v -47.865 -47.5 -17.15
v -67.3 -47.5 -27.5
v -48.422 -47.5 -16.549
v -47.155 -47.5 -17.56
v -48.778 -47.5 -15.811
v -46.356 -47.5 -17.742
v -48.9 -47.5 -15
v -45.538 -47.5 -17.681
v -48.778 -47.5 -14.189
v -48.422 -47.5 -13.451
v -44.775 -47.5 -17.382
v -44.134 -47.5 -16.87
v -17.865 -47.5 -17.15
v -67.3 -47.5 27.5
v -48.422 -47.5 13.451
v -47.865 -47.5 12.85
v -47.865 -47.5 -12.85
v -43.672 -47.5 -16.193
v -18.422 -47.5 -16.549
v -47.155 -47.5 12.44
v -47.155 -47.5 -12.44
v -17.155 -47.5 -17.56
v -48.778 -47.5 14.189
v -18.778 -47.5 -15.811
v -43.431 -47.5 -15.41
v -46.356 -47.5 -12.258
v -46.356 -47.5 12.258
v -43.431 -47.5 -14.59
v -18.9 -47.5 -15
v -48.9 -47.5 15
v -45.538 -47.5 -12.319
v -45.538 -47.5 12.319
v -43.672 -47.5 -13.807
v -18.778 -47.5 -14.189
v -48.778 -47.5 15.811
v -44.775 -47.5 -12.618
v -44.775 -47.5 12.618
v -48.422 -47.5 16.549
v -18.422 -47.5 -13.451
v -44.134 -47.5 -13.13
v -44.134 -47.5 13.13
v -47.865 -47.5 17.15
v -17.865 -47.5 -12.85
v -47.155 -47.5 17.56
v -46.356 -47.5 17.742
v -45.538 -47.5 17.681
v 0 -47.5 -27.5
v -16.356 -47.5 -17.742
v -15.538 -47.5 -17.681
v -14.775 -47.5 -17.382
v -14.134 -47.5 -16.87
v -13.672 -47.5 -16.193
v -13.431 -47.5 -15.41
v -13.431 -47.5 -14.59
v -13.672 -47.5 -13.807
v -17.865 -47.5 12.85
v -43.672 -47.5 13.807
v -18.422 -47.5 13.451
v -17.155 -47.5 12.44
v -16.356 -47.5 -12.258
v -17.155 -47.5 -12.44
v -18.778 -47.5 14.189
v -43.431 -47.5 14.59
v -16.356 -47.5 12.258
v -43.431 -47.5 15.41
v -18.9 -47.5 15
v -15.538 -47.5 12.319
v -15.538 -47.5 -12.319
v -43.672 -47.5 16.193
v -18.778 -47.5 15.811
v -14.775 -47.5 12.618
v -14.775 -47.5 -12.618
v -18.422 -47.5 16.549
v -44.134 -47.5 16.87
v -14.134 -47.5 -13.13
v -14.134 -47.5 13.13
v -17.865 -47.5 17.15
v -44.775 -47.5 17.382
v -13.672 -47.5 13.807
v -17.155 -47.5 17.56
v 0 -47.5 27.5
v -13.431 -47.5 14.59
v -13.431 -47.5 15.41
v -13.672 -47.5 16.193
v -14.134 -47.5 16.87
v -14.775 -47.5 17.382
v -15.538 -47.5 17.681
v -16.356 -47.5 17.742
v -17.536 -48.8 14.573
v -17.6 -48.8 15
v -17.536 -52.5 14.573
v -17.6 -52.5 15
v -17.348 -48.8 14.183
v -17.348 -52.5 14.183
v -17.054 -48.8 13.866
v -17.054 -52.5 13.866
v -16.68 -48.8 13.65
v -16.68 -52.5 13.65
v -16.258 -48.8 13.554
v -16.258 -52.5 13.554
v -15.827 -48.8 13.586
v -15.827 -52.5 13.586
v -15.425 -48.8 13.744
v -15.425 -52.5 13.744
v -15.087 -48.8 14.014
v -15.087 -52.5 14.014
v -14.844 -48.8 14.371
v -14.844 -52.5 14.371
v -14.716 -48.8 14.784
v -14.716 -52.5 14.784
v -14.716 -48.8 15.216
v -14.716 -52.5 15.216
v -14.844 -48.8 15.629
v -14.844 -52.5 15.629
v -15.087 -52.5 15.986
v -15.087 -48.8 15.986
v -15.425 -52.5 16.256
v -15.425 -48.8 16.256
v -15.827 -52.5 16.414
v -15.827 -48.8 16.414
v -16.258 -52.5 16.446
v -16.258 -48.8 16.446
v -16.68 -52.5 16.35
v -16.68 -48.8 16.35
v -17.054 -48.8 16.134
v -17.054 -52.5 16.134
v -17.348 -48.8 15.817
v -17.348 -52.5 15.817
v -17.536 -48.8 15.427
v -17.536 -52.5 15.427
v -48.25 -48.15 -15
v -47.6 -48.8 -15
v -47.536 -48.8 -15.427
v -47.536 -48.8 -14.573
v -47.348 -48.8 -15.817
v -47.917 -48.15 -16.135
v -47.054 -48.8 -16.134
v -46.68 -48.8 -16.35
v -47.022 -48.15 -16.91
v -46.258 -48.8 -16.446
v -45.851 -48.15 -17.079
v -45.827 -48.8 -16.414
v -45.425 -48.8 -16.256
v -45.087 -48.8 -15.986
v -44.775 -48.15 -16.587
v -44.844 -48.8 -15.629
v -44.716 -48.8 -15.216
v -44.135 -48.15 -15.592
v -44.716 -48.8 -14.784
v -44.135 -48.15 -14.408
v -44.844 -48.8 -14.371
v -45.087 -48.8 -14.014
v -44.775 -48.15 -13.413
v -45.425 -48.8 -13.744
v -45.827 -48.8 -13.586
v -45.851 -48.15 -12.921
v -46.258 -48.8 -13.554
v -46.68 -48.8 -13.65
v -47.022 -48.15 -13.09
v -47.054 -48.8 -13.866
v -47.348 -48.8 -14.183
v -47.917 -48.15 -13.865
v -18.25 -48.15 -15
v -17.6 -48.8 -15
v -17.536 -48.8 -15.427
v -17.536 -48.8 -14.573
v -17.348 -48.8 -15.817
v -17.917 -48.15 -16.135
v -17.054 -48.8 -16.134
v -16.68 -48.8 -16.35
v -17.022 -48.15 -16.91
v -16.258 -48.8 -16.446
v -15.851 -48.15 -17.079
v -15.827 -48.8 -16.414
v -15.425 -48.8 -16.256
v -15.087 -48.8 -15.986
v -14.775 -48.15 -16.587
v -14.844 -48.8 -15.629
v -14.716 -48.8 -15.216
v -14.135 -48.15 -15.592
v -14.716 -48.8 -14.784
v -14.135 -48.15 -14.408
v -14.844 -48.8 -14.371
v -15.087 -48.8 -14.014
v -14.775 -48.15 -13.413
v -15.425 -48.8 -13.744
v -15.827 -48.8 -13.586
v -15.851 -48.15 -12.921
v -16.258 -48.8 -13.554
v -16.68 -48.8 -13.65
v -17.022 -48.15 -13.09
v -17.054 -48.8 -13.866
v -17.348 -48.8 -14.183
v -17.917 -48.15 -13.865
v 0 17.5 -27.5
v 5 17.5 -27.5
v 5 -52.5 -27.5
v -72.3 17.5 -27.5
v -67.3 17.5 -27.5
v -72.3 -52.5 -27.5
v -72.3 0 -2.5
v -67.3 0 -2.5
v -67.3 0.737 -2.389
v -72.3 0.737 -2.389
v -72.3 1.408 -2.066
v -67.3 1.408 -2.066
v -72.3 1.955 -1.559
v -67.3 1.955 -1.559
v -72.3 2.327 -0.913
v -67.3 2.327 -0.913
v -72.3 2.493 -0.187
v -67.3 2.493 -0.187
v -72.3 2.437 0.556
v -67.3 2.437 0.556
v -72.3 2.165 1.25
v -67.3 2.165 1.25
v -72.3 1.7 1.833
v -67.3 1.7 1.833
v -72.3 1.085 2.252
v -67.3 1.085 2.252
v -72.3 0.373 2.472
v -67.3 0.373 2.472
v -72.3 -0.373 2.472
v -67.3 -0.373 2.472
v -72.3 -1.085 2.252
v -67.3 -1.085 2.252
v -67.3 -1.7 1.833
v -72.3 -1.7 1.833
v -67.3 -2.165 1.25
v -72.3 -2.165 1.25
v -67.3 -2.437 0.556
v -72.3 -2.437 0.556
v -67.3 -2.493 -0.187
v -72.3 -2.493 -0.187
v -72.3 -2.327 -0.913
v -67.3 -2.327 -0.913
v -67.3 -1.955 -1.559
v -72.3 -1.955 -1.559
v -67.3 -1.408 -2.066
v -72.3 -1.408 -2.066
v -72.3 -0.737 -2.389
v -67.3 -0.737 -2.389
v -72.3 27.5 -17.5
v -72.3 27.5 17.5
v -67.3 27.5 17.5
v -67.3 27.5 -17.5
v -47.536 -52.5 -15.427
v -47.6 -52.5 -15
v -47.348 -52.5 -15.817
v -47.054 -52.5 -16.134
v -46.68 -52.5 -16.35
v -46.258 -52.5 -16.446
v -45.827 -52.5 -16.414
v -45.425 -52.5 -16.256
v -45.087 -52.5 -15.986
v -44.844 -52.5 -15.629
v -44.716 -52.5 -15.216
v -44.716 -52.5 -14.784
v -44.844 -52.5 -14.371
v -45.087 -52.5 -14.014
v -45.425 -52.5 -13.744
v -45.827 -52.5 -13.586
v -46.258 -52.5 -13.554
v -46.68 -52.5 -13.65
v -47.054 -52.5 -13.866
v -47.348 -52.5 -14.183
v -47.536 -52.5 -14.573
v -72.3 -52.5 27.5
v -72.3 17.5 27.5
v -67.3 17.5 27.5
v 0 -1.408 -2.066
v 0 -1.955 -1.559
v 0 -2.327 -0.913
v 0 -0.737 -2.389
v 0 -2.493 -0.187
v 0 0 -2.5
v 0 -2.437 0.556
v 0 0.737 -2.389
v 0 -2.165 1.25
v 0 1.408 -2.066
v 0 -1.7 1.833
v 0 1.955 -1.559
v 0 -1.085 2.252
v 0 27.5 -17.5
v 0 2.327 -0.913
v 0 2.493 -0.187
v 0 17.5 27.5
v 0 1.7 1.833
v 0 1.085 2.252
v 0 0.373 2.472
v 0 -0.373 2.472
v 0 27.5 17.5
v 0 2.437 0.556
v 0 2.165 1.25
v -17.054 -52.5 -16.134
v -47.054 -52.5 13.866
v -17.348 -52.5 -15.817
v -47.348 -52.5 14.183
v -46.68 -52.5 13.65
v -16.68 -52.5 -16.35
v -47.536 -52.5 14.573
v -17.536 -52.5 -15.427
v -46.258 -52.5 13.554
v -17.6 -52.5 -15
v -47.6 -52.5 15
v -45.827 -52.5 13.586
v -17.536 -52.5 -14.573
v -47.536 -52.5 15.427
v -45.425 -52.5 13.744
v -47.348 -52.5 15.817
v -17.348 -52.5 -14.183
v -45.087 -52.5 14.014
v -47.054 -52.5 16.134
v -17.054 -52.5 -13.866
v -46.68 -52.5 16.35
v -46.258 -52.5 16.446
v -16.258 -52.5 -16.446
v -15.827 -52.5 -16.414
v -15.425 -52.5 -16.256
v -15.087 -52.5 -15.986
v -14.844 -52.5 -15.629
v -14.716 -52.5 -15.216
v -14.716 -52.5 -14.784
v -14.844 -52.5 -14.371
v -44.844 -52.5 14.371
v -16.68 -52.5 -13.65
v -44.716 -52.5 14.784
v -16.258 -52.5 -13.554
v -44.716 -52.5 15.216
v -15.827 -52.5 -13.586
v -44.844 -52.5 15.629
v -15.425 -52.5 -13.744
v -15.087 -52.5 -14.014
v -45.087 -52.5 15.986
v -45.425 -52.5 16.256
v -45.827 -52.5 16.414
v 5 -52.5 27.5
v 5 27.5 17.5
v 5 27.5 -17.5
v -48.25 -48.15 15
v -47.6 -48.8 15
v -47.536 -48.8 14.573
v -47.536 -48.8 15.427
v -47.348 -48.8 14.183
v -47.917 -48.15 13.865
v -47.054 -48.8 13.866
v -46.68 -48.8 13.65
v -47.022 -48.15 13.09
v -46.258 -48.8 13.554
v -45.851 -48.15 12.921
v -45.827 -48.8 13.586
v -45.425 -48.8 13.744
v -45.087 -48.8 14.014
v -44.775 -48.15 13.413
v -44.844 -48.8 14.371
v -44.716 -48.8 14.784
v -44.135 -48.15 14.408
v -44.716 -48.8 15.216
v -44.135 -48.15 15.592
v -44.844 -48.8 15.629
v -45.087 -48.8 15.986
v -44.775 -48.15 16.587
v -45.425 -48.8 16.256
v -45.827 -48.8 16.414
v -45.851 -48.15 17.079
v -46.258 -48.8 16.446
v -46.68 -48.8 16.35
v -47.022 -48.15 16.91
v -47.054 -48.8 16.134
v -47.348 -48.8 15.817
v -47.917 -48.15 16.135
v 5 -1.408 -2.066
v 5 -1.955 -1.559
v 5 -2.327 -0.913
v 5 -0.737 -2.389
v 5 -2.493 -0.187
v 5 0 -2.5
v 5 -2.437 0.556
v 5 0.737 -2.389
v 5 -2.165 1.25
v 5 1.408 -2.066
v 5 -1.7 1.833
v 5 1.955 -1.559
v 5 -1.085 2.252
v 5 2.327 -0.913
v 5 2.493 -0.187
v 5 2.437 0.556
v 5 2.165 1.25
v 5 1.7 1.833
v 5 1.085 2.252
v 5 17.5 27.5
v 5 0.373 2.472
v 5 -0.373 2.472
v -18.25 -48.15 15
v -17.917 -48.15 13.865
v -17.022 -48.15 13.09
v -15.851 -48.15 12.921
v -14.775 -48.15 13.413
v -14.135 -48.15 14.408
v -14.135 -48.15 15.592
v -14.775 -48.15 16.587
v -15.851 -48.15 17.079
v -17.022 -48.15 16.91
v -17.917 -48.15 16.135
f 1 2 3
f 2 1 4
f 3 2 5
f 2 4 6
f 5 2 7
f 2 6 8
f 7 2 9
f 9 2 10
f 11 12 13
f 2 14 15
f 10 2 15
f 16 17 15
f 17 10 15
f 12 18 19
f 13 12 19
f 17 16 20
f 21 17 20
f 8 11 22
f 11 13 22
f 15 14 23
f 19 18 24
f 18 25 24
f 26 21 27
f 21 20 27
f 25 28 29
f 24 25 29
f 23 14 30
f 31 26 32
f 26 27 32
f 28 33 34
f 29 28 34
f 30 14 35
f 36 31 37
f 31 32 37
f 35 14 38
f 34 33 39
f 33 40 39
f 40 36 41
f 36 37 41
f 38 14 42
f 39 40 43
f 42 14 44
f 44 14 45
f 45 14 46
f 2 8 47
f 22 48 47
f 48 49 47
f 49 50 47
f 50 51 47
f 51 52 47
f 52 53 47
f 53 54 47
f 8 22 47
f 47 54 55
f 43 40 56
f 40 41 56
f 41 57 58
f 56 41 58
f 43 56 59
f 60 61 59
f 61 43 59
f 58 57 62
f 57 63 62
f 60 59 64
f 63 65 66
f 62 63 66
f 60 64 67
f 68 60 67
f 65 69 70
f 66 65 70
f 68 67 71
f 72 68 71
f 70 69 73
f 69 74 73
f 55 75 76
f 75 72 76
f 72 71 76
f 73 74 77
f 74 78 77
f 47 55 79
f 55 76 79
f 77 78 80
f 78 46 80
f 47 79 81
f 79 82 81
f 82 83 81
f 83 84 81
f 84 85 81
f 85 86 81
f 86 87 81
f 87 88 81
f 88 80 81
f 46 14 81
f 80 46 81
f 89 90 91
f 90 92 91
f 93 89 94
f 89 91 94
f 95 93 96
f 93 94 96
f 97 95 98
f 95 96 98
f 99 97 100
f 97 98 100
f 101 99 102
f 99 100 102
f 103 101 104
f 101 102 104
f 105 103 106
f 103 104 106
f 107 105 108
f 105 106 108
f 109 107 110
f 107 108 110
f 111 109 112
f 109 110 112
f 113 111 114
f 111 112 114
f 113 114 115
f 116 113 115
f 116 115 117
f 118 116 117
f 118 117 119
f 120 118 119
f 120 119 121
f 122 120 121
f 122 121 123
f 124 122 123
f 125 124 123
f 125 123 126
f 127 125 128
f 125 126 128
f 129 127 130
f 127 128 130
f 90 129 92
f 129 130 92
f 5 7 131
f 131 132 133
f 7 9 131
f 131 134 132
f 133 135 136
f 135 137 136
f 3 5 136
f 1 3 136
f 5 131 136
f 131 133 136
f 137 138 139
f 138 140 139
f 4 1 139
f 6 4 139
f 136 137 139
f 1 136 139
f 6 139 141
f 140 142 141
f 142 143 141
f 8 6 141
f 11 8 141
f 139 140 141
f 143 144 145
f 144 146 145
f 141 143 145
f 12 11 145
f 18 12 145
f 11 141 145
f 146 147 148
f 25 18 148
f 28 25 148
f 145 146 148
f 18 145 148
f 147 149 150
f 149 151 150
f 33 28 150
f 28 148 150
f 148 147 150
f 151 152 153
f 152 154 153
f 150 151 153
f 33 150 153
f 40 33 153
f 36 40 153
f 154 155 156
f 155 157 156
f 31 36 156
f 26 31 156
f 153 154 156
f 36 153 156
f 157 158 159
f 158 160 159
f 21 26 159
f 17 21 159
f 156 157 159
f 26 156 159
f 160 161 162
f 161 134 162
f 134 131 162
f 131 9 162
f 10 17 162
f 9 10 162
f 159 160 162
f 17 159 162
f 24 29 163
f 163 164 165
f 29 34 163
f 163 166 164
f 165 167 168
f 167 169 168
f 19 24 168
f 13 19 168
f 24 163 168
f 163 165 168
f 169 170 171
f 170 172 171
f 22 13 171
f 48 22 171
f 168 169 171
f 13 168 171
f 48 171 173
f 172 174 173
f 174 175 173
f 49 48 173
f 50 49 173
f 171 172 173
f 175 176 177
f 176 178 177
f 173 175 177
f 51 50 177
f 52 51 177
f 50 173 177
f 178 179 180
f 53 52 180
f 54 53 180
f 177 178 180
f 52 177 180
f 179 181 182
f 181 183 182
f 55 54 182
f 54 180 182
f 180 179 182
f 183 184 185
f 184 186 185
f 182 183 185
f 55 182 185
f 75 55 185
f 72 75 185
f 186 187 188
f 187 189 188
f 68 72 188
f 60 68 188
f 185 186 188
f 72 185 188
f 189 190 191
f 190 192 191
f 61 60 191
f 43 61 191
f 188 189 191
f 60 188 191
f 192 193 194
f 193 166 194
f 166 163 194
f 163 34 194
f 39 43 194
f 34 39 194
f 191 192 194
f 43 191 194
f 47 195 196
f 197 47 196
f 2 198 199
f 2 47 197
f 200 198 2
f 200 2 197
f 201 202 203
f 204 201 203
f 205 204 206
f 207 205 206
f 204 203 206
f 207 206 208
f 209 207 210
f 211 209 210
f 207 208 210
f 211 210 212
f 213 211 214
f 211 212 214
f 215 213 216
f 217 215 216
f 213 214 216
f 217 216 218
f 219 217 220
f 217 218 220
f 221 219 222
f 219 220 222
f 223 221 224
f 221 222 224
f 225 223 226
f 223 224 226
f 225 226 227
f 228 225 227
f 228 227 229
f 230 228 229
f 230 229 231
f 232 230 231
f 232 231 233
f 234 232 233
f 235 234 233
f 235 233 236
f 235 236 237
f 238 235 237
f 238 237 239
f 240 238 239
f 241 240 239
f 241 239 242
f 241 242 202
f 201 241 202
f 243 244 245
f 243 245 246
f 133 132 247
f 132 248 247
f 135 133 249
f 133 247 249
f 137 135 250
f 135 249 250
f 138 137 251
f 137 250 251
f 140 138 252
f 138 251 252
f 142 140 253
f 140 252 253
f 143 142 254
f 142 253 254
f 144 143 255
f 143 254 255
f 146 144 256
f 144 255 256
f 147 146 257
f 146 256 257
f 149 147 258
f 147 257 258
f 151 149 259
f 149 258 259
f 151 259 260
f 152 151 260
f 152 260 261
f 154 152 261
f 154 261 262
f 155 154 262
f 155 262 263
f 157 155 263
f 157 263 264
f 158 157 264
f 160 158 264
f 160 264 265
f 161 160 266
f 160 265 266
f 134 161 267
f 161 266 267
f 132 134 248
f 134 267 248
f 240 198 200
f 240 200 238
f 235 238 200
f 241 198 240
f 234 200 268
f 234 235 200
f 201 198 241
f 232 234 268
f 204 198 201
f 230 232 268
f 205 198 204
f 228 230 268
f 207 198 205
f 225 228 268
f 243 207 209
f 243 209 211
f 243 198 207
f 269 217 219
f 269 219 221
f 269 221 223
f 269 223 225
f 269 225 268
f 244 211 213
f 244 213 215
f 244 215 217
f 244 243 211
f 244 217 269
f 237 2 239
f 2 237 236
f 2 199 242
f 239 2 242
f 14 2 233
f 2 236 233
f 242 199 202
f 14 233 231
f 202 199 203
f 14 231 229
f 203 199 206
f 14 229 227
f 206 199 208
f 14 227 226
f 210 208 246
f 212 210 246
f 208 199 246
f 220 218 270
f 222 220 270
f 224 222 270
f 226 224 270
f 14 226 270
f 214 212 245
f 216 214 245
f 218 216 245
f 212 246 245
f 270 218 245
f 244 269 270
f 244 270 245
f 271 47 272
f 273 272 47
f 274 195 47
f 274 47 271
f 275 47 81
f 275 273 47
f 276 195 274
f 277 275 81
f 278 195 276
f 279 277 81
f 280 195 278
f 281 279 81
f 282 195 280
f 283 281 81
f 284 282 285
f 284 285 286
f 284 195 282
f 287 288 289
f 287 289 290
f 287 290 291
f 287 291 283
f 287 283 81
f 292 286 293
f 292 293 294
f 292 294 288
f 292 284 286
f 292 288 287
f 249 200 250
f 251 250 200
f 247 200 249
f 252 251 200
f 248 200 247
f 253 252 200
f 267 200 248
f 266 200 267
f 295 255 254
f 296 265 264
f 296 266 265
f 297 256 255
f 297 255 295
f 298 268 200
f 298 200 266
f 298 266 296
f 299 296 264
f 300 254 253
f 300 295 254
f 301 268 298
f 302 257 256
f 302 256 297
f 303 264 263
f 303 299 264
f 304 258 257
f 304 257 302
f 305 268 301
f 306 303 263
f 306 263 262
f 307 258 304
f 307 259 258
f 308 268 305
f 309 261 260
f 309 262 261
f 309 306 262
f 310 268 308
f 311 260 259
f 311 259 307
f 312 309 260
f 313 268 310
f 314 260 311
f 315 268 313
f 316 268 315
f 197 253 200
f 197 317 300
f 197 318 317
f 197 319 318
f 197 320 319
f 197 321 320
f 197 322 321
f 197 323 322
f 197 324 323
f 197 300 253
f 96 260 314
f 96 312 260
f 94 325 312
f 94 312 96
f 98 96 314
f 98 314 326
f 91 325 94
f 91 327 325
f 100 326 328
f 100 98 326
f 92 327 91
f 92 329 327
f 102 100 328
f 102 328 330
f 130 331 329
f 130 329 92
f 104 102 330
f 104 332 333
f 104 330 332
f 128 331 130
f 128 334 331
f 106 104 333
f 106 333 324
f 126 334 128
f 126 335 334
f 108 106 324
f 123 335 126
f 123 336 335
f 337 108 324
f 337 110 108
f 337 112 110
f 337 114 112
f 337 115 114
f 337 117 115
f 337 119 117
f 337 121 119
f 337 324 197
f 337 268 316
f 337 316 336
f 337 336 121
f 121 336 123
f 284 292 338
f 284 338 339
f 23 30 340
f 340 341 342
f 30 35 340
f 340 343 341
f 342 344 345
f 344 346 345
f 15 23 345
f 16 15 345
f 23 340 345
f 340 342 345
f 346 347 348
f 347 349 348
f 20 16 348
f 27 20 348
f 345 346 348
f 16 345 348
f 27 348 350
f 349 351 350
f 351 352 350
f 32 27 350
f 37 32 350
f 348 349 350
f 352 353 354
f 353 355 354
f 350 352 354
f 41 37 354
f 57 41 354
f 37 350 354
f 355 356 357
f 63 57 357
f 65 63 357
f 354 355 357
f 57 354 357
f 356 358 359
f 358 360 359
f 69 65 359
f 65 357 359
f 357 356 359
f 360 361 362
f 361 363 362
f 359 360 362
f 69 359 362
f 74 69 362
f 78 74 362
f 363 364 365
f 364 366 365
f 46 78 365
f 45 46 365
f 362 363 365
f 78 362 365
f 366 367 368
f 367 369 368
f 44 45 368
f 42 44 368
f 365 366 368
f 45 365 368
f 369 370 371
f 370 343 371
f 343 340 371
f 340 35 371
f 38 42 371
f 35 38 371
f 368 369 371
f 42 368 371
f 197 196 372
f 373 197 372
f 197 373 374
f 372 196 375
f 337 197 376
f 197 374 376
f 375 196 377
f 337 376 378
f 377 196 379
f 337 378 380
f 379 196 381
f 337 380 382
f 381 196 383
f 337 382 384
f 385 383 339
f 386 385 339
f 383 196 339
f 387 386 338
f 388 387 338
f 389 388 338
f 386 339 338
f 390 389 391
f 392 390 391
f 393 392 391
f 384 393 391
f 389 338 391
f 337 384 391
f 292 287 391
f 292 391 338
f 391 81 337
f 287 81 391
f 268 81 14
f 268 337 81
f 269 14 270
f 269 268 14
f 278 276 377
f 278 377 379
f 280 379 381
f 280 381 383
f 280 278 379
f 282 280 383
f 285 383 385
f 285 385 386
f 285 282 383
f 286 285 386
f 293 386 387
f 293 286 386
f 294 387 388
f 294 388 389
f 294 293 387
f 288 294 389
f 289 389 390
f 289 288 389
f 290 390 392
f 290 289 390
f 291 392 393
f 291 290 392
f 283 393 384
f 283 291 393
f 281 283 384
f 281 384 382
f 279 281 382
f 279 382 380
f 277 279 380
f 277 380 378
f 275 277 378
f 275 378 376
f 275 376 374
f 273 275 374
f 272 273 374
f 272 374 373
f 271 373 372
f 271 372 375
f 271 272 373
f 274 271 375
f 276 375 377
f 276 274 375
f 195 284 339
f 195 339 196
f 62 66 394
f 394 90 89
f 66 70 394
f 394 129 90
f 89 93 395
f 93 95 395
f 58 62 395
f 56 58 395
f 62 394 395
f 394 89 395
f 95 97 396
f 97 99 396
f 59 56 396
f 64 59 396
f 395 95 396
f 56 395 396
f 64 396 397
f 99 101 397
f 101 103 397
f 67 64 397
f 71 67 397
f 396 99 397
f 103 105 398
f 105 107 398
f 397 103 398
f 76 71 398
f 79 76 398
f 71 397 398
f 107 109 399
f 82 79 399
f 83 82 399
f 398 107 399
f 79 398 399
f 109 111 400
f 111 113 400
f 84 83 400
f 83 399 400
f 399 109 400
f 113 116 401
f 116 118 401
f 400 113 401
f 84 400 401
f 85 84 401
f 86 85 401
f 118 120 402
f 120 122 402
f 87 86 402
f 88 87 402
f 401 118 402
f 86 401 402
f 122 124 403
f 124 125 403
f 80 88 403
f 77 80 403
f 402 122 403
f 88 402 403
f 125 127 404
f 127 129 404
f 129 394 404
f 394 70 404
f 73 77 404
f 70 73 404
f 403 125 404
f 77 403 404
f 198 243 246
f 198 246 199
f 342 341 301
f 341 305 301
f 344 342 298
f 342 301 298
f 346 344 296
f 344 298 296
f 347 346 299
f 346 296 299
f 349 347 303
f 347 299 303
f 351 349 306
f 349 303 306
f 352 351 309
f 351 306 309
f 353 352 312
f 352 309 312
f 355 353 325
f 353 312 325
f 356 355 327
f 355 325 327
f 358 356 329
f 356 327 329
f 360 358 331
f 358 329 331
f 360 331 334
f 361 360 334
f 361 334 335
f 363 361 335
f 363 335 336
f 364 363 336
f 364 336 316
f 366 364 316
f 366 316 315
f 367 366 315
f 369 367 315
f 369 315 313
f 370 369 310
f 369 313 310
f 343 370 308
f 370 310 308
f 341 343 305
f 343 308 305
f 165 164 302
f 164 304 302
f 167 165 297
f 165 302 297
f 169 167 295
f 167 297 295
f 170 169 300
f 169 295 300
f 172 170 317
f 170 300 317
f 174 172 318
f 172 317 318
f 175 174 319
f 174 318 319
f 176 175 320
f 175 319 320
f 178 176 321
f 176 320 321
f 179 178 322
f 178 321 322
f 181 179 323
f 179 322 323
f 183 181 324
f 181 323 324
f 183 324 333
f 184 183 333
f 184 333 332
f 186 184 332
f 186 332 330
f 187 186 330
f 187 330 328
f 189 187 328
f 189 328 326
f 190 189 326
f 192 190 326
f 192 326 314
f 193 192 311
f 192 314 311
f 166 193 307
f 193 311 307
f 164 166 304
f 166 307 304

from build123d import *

# Parameters (mm, degrees)
SKETCH1_R                                         = 2.5
BOSS_EXTRUDE1_DEPTH                               = 5
SKETCH2_W                                         = 5
SKETCH2_H                                         = 55
BOSS_EXTRUDE2_DEPTH                               = 25
SKETCH3_W                                         = 72.3
SKETCH3_H                                         = 55
BOSS_EXTRUDE3_DEPTH                               = 5
BOSS_EXTRUDE4_DEPTH                               = 5
CUT_EXTRUDE1_REACH                                = 7
SKETCH5_R                                         = 2.5
CSK_FOR_M2_5_FLAT_HEAD_MACHINE_SCREW1_D           = 2.9
CSK_FOR_M2_5_FLAT_HEAD_MACHINE_SCREW1_CSINK_D     = 5.5
CSK_FOR_M2_5_FLAT_HEAD_MACHINE_SCREW1_CSINK_ANGLE = 90


with BuildPart() as part:
    # Sketch1 → Boss-Extrude1 (new body)
    with BuildSketch(Plane(origin=(0, 0, 0), x_dir=(0, 0, -1), z_dir=(1, 0, 0))):
        Polygon((-27.5, 17.5), (-17.5, 27.5), (17.5, 27.5), (27.5, 17.5), (27.5, -27.5), (-27.5, -27.5), align=None)
        Circle(SKETCH1_R, mode=Mode.SUBTRACT)
    extrude(amount=BOSS_EXTRUDE1_DEPTH)

    # Sketch2 → Boss-Extrude2 (add)
    with BuildSketch(Plane.XZ.offset(27.5)):
        with Locations((2.5, 0)):
            Rectangle(SKETCH2_W, SKETCH2_H)
    extrude(amount=BOSS_EXTRUDE2_DEPTH)

    # Sketch3 → Boss-Extrude3 (add)
    with BuildSketch(Plane.XZ.offset(52.5)):
        with Locations((-36.15, 0)):
            Rectangle(SKETCH3_W, SKETCH3_H)
    extrude(amount=-BOSS_EXTRUDE3_DEPTH)

    # Sketch4 → Boss-Extrude4 (add)
    with BuildSketch(Plane.ZY.offset(72.3)):
        Polygon((-17.5, 27.5), (-27.5, 17.5), (-27.5, -47.5), (27.5, -47.5), (27.5, 17.5), (17.5, 27.5), align=None)
    extrude(amount=-BOSS_EXTRUDE4_DEPTH)

    # Sketch5 → Cut-Extrude1 (cut, up to next)
    with BuildSketch(Plane(origin=(-67.3, 0, 0), x_dir=(0, 0, -1), z_dir=(1, 0, 0)), mode=Mode.PRIVATE) as cut_extrude1_sk1:
        Circle(SKETCH5_R)
    cut_extrude1_tool1 = extrude(cut_extrude1_sk1.sketch, amount=-CUT_EXTRUDE1_REACH, mode=Mode.PRIVATE) & part.part
    add(cut_extrude1_tool1.solids().sort_by_distance((-67.3, 0, 0))[0], mode=Mode.SUBTRACT)

    # CSK for M2.5 Flat Head Machine Screw1 (through all)
    with Locations(Plane(origin=(0, -47.5, 0), x_dir=(1, 0, 0), z_dir=(0, 1, 0))):
        with Locations((-16.15, 15), (-16.15, -15), (-46.15, -15), (-46.15, 15)):
            CounterSinkHole(CSK_FOR_M2_5_FLAT_HEAD_MACHINE_SCREW1_D / 2, CSK_FOR_M2_5_FLAT_HEAD_MACHINE_SCREW1_CSINK_D / 2, counter_sink_angle=CSK_FOR_M2_5_FLAT_HEAD_MACHINE_SCREW1_CSINK_ANGLE)


solid = part.part
